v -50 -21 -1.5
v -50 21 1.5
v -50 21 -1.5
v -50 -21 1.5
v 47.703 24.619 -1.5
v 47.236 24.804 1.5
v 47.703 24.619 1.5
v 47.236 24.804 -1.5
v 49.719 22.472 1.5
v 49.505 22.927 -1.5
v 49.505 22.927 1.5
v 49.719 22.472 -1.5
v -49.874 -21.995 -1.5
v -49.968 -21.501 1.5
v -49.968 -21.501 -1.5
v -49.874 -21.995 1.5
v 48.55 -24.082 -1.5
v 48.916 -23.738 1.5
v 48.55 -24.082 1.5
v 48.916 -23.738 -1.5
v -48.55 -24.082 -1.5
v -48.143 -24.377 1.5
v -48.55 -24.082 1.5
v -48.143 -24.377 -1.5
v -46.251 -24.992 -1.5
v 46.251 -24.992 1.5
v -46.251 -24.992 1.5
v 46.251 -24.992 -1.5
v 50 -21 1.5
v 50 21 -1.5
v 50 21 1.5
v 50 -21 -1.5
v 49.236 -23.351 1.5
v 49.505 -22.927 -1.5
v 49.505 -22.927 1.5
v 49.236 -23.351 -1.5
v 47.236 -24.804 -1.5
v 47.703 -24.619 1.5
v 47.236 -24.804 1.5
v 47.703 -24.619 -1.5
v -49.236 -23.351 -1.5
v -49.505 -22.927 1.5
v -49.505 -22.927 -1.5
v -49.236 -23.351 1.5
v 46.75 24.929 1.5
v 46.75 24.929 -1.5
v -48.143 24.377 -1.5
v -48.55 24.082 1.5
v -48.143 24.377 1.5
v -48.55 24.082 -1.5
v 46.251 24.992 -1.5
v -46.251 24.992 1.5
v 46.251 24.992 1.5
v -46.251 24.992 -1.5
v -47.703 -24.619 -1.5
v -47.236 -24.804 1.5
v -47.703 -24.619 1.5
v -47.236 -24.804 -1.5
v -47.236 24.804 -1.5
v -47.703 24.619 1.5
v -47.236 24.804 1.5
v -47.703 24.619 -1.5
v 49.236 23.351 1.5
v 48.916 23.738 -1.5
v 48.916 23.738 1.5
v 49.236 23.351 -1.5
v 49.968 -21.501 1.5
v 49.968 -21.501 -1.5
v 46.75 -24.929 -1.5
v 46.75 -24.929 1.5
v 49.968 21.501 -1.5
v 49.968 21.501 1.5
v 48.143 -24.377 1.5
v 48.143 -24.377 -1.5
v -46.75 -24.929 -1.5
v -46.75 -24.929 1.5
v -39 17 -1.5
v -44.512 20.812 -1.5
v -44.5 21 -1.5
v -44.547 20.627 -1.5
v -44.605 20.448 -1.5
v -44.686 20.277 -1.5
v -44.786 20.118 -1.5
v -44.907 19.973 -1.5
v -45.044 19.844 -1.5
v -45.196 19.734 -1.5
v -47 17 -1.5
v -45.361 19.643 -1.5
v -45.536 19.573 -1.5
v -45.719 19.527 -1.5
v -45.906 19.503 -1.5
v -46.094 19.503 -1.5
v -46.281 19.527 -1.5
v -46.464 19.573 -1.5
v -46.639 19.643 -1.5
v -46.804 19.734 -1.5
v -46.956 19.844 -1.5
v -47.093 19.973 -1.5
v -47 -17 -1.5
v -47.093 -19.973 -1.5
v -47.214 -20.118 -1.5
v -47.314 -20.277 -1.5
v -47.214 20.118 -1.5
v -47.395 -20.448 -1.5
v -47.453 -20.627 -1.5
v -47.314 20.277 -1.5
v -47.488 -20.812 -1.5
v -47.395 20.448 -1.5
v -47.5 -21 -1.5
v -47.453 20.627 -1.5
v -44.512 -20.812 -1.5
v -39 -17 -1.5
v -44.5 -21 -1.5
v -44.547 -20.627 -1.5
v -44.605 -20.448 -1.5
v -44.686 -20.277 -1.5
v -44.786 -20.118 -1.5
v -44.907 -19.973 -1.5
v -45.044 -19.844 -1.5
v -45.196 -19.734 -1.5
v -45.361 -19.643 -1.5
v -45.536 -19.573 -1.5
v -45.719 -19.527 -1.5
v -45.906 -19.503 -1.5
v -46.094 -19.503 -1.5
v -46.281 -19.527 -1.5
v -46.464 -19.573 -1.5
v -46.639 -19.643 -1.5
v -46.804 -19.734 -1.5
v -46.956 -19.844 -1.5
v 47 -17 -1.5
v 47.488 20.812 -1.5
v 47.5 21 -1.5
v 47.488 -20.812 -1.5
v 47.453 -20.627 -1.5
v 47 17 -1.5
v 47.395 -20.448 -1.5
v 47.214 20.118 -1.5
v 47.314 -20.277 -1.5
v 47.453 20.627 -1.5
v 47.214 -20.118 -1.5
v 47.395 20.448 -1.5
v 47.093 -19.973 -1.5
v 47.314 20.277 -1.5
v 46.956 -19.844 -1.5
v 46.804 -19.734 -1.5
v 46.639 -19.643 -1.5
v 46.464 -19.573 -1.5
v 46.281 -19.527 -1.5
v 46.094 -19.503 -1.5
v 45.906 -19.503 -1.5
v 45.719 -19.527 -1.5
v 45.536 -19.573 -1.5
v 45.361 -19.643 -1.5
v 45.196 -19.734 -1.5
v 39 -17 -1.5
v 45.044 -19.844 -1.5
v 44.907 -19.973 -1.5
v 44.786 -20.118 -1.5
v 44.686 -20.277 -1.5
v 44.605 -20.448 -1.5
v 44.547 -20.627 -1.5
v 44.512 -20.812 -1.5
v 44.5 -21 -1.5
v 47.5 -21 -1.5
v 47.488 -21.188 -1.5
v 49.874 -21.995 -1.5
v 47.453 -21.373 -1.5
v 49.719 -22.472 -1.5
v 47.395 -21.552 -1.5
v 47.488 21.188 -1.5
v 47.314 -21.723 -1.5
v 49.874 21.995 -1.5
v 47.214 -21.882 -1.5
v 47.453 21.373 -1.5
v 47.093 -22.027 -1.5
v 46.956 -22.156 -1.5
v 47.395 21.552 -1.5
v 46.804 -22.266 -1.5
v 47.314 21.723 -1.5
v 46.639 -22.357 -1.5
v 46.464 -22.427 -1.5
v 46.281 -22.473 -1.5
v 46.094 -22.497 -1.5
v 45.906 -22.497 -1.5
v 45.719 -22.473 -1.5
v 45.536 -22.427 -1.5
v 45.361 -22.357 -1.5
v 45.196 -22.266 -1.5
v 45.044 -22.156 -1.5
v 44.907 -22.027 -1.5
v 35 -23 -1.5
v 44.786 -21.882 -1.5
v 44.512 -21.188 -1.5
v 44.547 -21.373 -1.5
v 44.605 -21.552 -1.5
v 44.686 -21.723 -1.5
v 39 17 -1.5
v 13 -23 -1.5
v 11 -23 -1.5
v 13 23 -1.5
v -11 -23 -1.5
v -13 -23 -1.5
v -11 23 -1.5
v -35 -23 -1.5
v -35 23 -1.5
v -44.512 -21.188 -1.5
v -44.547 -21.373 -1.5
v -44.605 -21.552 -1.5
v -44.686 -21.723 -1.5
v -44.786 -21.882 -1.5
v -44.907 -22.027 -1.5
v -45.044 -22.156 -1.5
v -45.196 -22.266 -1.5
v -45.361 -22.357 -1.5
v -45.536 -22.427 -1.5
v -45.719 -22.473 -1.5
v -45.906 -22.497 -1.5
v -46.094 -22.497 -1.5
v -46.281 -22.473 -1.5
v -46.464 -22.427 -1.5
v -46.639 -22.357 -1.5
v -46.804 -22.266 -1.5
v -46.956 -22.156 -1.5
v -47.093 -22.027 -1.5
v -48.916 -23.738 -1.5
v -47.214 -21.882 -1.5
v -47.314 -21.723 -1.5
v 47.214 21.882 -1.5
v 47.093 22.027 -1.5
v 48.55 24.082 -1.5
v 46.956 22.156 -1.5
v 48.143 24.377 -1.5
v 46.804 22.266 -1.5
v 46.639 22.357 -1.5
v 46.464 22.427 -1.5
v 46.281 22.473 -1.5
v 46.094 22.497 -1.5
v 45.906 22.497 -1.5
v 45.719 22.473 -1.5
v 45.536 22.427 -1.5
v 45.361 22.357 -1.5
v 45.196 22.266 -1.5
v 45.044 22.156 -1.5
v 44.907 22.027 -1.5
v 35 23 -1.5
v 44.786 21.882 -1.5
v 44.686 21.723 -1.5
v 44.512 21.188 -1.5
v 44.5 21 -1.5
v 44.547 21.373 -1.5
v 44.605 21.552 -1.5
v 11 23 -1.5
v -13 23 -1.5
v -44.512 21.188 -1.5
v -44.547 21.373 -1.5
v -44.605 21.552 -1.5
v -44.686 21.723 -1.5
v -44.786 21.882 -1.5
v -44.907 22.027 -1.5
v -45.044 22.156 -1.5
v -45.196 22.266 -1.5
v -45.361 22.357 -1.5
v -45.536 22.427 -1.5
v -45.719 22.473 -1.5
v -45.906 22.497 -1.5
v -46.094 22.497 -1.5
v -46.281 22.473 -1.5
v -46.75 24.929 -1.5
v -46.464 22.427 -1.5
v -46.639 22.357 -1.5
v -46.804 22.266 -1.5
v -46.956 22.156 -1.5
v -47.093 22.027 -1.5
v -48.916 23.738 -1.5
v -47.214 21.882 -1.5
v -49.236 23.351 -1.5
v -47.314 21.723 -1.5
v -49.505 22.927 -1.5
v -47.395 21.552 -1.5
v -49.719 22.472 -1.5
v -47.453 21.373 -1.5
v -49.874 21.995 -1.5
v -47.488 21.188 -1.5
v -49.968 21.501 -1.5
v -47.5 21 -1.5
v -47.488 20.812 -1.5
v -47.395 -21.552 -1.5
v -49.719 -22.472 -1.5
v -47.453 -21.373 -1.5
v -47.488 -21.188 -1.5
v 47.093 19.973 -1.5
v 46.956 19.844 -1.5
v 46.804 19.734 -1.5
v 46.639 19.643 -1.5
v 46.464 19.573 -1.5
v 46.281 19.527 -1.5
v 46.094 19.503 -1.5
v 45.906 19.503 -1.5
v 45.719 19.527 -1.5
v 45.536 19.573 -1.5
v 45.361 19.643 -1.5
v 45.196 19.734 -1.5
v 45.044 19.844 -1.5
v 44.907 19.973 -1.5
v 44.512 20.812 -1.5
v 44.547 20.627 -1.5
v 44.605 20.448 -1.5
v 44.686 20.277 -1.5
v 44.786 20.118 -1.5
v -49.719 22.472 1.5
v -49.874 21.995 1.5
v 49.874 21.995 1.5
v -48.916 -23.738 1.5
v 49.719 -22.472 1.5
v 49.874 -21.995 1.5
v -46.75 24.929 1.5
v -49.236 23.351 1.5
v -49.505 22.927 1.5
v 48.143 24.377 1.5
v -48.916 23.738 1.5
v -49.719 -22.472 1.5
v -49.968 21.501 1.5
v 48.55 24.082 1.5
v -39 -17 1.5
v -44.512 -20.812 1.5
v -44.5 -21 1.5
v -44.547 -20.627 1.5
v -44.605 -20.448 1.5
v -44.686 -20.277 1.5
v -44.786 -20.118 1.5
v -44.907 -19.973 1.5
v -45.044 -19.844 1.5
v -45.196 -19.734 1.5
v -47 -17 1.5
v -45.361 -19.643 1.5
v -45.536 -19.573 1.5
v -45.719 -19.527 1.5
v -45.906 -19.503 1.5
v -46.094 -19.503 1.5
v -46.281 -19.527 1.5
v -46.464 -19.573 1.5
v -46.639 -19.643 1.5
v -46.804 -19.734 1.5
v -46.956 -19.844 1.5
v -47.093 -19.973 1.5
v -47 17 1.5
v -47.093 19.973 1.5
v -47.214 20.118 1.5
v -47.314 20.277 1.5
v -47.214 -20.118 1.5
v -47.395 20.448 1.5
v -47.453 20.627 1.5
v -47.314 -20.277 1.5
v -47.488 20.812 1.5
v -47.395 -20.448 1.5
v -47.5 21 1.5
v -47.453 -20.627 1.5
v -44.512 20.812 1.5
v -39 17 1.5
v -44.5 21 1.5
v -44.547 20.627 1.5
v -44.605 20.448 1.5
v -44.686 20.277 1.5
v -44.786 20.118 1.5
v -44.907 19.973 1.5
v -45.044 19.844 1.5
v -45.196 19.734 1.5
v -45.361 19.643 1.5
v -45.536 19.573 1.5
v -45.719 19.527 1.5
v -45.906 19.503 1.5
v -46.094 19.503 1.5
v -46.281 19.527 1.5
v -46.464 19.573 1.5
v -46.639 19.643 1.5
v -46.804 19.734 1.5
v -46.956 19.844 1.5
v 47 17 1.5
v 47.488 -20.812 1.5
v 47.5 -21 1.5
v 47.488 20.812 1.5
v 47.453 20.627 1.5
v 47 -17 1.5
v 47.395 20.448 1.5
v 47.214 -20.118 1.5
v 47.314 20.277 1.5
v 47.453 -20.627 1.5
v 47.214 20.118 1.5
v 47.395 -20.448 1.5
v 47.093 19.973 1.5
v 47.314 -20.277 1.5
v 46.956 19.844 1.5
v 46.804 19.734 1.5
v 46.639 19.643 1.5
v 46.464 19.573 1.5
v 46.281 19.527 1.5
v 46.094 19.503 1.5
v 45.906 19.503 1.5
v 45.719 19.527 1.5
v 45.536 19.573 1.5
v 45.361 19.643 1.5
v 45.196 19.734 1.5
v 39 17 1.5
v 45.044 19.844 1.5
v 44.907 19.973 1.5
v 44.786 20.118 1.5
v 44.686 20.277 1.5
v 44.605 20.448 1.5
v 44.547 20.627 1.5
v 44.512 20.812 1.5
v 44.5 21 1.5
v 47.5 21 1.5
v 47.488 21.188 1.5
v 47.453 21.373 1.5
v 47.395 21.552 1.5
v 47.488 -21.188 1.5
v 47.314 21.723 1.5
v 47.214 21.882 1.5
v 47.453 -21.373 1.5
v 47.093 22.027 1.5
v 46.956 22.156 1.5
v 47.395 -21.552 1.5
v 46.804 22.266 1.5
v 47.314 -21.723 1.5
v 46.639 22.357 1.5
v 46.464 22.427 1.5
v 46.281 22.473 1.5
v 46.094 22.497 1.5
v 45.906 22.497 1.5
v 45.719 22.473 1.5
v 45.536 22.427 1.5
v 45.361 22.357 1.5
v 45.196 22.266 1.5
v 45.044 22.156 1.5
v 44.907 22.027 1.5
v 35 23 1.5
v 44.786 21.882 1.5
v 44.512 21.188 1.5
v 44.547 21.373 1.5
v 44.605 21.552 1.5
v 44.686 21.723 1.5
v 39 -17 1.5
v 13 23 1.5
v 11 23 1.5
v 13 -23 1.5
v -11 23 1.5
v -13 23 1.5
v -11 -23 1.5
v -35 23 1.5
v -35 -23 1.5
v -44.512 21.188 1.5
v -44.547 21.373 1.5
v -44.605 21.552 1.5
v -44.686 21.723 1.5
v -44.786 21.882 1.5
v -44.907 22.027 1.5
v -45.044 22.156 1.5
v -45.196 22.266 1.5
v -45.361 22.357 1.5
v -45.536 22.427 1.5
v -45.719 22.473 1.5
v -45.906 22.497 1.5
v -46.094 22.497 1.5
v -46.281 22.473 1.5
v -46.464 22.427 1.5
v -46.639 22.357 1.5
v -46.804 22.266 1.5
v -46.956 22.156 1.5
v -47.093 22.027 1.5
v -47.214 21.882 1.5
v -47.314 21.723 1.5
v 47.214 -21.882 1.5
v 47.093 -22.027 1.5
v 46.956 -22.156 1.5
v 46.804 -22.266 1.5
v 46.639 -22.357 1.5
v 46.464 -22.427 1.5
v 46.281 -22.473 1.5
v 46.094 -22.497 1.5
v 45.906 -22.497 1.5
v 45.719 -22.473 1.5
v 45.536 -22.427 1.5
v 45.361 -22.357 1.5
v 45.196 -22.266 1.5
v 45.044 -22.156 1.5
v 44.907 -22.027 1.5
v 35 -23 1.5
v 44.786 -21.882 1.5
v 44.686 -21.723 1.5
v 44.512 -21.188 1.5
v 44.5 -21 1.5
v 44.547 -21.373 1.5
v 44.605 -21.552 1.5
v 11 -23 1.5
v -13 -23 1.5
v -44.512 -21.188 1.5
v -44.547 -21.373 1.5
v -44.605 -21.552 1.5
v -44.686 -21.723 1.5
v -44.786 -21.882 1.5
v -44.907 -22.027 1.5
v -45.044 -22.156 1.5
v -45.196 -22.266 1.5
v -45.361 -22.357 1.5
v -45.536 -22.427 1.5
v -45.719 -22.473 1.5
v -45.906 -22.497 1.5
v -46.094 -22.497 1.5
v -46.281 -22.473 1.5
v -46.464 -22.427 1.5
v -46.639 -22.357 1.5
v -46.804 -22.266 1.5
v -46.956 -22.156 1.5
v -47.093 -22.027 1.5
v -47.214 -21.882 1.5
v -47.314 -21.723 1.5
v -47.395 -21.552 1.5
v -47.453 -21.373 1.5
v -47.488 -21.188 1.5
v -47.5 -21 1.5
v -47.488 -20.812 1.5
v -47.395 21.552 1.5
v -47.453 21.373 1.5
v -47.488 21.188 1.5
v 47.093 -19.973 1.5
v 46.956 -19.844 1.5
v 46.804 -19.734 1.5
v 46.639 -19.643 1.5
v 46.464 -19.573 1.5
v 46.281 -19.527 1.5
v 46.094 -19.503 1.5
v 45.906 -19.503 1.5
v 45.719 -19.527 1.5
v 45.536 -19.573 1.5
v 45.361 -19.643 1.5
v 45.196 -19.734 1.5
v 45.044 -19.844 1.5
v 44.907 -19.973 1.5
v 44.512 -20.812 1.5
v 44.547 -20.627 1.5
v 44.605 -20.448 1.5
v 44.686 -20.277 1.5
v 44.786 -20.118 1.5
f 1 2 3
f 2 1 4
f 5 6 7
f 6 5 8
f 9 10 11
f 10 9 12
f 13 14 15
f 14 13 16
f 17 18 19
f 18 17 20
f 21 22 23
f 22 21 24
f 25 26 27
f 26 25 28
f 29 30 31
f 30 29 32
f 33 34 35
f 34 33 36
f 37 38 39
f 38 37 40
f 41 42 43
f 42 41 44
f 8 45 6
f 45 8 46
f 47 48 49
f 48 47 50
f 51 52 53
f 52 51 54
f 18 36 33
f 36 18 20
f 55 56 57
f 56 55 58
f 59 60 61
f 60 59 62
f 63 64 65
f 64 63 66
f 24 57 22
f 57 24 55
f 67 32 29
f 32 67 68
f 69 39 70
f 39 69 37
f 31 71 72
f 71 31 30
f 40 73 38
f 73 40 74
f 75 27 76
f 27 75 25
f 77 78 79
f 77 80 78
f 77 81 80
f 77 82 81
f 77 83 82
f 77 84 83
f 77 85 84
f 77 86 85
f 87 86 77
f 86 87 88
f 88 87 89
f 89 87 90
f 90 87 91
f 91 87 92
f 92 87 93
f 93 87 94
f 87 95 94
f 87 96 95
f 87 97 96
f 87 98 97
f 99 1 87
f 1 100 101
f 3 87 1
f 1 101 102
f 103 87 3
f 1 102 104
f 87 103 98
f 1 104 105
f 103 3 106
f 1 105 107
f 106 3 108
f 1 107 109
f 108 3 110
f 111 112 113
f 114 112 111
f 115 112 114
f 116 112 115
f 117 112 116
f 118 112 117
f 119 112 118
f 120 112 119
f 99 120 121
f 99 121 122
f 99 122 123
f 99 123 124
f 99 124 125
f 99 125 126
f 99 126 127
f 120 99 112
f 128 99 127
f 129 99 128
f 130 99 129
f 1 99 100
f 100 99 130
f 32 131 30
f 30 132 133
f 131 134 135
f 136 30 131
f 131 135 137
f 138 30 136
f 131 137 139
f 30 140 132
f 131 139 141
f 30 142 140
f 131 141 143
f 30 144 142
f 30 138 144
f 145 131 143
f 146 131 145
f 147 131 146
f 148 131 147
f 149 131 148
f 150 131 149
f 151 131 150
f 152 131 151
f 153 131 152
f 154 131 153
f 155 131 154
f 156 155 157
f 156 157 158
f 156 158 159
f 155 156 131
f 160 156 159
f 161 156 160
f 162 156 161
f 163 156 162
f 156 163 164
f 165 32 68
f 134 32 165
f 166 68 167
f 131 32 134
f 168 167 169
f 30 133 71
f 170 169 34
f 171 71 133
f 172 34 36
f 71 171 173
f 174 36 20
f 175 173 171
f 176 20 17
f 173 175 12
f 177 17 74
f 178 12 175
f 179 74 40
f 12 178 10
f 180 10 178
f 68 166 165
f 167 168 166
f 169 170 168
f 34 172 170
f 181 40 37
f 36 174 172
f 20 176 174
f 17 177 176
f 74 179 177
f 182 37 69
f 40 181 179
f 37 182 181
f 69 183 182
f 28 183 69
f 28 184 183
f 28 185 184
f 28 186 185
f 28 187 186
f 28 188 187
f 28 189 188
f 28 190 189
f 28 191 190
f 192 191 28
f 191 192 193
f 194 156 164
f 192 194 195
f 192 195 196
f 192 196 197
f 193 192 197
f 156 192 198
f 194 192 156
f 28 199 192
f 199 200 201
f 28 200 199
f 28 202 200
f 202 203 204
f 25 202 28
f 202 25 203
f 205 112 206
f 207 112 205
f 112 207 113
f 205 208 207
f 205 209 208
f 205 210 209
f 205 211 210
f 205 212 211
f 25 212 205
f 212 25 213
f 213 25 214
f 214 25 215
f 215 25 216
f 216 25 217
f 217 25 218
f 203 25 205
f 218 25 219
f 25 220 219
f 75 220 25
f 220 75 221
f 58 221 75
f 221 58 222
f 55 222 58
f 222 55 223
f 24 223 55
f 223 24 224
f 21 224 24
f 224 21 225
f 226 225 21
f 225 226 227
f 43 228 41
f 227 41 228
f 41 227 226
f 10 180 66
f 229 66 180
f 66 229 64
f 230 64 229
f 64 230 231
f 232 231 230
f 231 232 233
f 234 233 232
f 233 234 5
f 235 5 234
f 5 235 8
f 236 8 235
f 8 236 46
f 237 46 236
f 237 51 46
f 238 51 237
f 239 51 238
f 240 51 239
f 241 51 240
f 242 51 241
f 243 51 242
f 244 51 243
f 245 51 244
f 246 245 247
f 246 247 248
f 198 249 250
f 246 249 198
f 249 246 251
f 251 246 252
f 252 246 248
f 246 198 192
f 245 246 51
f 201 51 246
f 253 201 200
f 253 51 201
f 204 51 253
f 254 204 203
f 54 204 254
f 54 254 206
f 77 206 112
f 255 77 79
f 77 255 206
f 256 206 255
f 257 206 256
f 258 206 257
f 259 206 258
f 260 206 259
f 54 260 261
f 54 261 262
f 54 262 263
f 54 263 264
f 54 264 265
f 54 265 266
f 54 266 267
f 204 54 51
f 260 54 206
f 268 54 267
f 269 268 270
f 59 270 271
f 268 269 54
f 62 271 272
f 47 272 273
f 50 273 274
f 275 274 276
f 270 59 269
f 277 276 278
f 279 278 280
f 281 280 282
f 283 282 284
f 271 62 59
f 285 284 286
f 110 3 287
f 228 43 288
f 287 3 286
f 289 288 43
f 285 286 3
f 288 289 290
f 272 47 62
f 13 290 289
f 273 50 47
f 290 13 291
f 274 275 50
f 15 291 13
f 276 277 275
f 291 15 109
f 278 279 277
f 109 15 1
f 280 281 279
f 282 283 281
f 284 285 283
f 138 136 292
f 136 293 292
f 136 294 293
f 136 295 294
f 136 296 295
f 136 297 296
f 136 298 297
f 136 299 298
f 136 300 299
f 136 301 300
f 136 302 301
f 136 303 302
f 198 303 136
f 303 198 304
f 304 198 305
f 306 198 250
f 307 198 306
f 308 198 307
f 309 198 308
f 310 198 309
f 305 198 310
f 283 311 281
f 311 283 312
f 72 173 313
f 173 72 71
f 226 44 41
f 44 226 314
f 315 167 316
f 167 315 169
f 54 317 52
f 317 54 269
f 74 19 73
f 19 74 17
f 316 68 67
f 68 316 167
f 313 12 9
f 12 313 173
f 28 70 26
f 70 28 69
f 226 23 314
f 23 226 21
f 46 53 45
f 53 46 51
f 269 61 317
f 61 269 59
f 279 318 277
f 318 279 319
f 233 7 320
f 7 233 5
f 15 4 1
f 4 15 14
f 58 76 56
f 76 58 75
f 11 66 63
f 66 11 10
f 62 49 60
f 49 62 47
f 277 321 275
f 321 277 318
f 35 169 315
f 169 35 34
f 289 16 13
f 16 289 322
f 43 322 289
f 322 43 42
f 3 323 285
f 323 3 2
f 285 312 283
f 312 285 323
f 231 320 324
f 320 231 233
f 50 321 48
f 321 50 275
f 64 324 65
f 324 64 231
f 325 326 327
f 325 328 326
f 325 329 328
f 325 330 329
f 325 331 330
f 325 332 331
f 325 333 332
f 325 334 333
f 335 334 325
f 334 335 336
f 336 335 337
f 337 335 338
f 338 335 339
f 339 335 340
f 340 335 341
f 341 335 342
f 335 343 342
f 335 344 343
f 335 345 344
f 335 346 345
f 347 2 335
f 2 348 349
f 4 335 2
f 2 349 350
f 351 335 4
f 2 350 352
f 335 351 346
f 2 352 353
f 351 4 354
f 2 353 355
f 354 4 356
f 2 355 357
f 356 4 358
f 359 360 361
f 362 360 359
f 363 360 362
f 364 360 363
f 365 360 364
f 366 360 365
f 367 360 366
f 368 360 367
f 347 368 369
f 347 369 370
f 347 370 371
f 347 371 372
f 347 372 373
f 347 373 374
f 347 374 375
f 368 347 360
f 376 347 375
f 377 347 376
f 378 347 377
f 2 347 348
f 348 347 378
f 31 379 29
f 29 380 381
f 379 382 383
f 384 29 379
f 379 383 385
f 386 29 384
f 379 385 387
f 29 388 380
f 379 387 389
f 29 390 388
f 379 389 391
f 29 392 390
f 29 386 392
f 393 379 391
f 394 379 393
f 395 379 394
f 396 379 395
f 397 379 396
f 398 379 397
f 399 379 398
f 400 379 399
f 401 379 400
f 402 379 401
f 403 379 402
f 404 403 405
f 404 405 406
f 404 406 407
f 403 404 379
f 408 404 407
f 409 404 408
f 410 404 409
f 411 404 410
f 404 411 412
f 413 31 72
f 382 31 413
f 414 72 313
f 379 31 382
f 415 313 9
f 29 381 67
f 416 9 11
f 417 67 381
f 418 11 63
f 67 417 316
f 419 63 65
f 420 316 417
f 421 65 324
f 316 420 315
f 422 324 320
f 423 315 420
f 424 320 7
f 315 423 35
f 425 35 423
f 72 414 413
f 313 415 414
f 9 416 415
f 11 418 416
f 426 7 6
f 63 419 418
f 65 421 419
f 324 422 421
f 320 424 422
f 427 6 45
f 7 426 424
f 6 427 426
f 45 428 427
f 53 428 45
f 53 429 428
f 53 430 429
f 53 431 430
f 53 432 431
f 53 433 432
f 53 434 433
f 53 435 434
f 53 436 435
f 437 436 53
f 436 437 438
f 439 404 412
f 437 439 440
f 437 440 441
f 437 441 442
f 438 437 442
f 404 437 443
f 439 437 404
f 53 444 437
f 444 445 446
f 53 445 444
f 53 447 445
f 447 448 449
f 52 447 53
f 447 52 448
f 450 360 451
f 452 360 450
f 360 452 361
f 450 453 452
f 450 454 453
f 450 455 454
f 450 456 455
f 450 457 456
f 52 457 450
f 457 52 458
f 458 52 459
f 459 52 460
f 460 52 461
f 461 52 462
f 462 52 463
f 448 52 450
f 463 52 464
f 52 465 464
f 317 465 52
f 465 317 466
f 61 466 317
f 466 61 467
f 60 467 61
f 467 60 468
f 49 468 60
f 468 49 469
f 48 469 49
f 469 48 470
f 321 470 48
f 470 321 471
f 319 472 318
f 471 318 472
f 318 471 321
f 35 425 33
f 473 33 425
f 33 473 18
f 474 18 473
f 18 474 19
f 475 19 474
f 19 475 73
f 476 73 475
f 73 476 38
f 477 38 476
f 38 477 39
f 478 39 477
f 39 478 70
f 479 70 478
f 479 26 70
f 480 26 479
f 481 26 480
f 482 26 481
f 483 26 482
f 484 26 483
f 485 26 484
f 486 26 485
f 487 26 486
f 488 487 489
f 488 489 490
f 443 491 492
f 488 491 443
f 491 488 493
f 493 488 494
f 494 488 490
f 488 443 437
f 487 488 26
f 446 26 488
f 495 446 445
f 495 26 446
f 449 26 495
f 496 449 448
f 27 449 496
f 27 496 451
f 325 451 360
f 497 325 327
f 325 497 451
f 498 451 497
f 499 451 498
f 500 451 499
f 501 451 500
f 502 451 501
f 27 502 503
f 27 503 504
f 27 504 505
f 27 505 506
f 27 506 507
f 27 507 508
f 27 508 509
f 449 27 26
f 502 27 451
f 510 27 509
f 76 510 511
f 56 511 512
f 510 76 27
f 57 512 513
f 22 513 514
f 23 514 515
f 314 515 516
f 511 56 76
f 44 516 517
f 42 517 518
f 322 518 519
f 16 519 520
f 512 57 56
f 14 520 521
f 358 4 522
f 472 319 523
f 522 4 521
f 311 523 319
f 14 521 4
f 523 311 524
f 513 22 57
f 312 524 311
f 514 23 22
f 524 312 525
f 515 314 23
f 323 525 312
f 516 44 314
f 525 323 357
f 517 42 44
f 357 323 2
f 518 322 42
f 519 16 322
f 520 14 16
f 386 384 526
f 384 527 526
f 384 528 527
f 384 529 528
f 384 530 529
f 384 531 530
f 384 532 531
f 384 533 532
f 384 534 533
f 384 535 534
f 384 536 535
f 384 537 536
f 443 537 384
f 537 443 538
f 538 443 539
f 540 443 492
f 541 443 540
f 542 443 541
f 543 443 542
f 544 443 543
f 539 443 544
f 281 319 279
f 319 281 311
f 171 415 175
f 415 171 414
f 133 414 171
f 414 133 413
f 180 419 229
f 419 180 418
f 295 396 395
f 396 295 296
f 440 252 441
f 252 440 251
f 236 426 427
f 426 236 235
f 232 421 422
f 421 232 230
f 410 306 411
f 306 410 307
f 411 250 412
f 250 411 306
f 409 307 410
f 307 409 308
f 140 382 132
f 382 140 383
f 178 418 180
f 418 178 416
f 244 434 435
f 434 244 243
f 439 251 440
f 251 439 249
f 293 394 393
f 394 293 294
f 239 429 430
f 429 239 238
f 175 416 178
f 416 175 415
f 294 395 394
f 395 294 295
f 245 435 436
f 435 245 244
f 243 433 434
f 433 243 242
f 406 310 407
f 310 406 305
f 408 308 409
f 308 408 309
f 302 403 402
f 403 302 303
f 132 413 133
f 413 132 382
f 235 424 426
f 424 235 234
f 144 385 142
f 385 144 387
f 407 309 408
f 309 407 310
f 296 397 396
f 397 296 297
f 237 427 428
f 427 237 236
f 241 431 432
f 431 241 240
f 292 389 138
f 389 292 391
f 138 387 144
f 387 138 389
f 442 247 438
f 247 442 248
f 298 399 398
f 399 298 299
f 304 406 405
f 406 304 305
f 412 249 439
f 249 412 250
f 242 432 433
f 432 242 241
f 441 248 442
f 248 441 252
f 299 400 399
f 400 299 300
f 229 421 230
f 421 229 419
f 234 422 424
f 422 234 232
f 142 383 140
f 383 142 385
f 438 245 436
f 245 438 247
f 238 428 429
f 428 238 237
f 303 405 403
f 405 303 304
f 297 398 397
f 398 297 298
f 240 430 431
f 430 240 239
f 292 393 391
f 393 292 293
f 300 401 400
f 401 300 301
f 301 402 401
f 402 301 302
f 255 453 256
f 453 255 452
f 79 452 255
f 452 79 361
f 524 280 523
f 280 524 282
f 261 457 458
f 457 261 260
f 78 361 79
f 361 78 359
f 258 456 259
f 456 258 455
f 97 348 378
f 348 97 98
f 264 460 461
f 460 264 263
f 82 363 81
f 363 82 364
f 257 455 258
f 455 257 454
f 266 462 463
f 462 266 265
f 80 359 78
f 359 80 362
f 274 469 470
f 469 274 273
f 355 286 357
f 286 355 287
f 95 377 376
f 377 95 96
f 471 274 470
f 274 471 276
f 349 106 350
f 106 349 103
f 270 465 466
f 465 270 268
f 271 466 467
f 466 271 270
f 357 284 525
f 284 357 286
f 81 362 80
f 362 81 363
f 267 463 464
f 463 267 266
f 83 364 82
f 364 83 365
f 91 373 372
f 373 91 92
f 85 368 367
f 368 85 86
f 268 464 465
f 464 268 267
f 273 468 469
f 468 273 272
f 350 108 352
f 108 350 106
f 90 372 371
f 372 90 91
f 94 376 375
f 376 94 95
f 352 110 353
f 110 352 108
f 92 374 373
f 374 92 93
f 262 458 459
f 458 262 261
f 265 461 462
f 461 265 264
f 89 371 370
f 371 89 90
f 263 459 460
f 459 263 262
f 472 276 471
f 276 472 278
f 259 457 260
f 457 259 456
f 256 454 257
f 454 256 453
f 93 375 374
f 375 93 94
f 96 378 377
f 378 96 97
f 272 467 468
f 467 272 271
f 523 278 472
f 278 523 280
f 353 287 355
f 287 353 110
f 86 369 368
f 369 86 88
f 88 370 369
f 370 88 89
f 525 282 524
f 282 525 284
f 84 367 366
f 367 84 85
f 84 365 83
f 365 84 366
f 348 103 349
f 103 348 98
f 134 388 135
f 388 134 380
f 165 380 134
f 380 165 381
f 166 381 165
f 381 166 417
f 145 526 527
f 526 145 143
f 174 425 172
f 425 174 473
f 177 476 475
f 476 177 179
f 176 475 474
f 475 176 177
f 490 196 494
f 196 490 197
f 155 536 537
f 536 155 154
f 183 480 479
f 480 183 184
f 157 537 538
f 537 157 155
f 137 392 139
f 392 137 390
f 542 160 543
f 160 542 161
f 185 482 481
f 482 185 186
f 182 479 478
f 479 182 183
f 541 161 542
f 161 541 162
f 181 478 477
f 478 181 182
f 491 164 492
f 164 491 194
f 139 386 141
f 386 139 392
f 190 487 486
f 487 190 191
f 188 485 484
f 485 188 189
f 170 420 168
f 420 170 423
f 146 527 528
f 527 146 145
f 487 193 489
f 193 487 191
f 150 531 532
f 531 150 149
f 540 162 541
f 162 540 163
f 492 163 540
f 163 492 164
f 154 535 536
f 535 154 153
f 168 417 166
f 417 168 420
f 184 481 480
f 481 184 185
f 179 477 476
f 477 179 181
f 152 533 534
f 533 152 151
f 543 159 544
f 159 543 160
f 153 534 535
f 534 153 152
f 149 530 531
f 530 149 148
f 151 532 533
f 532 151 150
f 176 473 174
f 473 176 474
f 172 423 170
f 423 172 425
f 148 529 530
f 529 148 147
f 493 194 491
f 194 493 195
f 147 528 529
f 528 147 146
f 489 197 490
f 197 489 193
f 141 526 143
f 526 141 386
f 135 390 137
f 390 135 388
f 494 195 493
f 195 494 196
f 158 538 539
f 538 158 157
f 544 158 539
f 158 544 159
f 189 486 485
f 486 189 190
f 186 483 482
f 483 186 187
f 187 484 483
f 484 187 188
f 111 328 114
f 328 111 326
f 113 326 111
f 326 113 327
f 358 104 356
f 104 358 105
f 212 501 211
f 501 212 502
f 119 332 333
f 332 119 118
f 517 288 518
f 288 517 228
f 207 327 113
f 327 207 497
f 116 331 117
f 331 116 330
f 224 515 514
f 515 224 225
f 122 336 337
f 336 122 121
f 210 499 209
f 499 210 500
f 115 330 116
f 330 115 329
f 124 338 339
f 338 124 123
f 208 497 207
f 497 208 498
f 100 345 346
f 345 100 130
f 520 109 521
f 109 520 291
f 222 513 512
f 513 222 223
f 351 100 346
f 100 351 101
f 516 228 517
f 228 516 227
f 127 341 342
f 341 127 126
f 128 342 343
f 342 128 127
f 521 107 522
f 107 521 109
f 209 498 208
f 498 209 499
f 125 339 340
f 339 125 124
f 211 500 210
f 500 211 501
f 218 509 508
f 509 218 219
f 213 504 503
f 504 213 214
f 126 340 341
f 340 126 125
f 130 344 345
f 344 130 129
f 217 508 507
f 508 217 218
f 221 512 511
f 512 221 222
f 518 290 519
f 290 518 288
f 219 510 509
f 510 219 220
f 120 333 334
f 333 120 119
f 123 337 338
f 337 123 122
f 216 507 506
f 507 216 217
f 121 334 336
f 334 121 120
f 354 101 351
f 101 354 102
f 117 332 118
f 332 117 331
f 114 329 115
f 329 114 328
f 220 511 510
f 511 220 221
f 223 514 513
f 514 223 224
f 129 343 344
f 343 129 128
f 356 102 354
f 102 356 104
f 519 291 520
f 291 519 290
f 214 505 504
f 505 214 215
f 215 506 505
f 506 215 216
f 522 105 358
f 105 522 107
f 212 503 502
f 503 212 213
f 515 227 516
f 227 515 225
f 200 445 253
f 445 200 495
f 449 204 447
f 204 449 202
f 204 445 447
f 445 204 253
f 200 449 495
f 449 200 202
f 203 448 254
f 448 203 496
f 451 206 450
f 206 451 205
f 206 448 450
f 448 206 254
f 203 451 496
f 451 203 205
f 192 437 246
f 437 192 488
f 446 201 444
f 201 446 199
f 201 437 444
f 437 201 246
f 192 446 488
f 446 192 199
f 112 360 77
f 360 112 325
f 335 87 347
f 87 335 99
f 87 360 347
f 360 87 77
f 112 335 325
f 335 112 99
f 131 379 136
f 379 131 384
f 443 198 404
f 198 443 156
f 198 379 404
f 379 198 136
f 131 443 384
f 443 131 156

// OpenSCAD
$fn=50;

// 92x42x3mm
//100x50
//radius 4mm

fudge=0.1;
sheetTh=3;
edgeRad=4;
sizeX = 100;
sizeY = 50;

drillX = 92;
drillY = 42;
drill  = 2.4;

//!projection()
difference(){
        minkowski(){
            cube([100-edgeRad*2,50-edgeRad*2,sheetTh-1],true);
            cylinder(h=1,r=edgeRad,center=true);
        }
        //holes
        translate([drillX/2,drillY/2,0]) cylinder(h=sheetTh+fudge,d=3,center=true);
        translate([-drillX/2,drillY/2,0]) cylinder(h=sheetTh+fudge,d=3,center=true);
        translate([drillX/2,-drillY/2,0]) cylinder(h=sheetTh+fudge,d=3,center=true);
        translate([-drillX/2,-drillY/2,0]) cylinder(h=sheetTh+fudge,d=3,center=true);
        //components
        cube([22,46,sheetTh+fudge],true);
        translate([-24,0,0])    cube([22,46,sheetTh+fudge],true);
        translate([24,0,0])     cube([22,46,sheetTh+fudge],true);
        translate([-43,0,0])    cube([8,34,sheetTh+fudge],true);
        translate([43,0,0])     cube([8,34,sheetTh+fudge],true);
    }
